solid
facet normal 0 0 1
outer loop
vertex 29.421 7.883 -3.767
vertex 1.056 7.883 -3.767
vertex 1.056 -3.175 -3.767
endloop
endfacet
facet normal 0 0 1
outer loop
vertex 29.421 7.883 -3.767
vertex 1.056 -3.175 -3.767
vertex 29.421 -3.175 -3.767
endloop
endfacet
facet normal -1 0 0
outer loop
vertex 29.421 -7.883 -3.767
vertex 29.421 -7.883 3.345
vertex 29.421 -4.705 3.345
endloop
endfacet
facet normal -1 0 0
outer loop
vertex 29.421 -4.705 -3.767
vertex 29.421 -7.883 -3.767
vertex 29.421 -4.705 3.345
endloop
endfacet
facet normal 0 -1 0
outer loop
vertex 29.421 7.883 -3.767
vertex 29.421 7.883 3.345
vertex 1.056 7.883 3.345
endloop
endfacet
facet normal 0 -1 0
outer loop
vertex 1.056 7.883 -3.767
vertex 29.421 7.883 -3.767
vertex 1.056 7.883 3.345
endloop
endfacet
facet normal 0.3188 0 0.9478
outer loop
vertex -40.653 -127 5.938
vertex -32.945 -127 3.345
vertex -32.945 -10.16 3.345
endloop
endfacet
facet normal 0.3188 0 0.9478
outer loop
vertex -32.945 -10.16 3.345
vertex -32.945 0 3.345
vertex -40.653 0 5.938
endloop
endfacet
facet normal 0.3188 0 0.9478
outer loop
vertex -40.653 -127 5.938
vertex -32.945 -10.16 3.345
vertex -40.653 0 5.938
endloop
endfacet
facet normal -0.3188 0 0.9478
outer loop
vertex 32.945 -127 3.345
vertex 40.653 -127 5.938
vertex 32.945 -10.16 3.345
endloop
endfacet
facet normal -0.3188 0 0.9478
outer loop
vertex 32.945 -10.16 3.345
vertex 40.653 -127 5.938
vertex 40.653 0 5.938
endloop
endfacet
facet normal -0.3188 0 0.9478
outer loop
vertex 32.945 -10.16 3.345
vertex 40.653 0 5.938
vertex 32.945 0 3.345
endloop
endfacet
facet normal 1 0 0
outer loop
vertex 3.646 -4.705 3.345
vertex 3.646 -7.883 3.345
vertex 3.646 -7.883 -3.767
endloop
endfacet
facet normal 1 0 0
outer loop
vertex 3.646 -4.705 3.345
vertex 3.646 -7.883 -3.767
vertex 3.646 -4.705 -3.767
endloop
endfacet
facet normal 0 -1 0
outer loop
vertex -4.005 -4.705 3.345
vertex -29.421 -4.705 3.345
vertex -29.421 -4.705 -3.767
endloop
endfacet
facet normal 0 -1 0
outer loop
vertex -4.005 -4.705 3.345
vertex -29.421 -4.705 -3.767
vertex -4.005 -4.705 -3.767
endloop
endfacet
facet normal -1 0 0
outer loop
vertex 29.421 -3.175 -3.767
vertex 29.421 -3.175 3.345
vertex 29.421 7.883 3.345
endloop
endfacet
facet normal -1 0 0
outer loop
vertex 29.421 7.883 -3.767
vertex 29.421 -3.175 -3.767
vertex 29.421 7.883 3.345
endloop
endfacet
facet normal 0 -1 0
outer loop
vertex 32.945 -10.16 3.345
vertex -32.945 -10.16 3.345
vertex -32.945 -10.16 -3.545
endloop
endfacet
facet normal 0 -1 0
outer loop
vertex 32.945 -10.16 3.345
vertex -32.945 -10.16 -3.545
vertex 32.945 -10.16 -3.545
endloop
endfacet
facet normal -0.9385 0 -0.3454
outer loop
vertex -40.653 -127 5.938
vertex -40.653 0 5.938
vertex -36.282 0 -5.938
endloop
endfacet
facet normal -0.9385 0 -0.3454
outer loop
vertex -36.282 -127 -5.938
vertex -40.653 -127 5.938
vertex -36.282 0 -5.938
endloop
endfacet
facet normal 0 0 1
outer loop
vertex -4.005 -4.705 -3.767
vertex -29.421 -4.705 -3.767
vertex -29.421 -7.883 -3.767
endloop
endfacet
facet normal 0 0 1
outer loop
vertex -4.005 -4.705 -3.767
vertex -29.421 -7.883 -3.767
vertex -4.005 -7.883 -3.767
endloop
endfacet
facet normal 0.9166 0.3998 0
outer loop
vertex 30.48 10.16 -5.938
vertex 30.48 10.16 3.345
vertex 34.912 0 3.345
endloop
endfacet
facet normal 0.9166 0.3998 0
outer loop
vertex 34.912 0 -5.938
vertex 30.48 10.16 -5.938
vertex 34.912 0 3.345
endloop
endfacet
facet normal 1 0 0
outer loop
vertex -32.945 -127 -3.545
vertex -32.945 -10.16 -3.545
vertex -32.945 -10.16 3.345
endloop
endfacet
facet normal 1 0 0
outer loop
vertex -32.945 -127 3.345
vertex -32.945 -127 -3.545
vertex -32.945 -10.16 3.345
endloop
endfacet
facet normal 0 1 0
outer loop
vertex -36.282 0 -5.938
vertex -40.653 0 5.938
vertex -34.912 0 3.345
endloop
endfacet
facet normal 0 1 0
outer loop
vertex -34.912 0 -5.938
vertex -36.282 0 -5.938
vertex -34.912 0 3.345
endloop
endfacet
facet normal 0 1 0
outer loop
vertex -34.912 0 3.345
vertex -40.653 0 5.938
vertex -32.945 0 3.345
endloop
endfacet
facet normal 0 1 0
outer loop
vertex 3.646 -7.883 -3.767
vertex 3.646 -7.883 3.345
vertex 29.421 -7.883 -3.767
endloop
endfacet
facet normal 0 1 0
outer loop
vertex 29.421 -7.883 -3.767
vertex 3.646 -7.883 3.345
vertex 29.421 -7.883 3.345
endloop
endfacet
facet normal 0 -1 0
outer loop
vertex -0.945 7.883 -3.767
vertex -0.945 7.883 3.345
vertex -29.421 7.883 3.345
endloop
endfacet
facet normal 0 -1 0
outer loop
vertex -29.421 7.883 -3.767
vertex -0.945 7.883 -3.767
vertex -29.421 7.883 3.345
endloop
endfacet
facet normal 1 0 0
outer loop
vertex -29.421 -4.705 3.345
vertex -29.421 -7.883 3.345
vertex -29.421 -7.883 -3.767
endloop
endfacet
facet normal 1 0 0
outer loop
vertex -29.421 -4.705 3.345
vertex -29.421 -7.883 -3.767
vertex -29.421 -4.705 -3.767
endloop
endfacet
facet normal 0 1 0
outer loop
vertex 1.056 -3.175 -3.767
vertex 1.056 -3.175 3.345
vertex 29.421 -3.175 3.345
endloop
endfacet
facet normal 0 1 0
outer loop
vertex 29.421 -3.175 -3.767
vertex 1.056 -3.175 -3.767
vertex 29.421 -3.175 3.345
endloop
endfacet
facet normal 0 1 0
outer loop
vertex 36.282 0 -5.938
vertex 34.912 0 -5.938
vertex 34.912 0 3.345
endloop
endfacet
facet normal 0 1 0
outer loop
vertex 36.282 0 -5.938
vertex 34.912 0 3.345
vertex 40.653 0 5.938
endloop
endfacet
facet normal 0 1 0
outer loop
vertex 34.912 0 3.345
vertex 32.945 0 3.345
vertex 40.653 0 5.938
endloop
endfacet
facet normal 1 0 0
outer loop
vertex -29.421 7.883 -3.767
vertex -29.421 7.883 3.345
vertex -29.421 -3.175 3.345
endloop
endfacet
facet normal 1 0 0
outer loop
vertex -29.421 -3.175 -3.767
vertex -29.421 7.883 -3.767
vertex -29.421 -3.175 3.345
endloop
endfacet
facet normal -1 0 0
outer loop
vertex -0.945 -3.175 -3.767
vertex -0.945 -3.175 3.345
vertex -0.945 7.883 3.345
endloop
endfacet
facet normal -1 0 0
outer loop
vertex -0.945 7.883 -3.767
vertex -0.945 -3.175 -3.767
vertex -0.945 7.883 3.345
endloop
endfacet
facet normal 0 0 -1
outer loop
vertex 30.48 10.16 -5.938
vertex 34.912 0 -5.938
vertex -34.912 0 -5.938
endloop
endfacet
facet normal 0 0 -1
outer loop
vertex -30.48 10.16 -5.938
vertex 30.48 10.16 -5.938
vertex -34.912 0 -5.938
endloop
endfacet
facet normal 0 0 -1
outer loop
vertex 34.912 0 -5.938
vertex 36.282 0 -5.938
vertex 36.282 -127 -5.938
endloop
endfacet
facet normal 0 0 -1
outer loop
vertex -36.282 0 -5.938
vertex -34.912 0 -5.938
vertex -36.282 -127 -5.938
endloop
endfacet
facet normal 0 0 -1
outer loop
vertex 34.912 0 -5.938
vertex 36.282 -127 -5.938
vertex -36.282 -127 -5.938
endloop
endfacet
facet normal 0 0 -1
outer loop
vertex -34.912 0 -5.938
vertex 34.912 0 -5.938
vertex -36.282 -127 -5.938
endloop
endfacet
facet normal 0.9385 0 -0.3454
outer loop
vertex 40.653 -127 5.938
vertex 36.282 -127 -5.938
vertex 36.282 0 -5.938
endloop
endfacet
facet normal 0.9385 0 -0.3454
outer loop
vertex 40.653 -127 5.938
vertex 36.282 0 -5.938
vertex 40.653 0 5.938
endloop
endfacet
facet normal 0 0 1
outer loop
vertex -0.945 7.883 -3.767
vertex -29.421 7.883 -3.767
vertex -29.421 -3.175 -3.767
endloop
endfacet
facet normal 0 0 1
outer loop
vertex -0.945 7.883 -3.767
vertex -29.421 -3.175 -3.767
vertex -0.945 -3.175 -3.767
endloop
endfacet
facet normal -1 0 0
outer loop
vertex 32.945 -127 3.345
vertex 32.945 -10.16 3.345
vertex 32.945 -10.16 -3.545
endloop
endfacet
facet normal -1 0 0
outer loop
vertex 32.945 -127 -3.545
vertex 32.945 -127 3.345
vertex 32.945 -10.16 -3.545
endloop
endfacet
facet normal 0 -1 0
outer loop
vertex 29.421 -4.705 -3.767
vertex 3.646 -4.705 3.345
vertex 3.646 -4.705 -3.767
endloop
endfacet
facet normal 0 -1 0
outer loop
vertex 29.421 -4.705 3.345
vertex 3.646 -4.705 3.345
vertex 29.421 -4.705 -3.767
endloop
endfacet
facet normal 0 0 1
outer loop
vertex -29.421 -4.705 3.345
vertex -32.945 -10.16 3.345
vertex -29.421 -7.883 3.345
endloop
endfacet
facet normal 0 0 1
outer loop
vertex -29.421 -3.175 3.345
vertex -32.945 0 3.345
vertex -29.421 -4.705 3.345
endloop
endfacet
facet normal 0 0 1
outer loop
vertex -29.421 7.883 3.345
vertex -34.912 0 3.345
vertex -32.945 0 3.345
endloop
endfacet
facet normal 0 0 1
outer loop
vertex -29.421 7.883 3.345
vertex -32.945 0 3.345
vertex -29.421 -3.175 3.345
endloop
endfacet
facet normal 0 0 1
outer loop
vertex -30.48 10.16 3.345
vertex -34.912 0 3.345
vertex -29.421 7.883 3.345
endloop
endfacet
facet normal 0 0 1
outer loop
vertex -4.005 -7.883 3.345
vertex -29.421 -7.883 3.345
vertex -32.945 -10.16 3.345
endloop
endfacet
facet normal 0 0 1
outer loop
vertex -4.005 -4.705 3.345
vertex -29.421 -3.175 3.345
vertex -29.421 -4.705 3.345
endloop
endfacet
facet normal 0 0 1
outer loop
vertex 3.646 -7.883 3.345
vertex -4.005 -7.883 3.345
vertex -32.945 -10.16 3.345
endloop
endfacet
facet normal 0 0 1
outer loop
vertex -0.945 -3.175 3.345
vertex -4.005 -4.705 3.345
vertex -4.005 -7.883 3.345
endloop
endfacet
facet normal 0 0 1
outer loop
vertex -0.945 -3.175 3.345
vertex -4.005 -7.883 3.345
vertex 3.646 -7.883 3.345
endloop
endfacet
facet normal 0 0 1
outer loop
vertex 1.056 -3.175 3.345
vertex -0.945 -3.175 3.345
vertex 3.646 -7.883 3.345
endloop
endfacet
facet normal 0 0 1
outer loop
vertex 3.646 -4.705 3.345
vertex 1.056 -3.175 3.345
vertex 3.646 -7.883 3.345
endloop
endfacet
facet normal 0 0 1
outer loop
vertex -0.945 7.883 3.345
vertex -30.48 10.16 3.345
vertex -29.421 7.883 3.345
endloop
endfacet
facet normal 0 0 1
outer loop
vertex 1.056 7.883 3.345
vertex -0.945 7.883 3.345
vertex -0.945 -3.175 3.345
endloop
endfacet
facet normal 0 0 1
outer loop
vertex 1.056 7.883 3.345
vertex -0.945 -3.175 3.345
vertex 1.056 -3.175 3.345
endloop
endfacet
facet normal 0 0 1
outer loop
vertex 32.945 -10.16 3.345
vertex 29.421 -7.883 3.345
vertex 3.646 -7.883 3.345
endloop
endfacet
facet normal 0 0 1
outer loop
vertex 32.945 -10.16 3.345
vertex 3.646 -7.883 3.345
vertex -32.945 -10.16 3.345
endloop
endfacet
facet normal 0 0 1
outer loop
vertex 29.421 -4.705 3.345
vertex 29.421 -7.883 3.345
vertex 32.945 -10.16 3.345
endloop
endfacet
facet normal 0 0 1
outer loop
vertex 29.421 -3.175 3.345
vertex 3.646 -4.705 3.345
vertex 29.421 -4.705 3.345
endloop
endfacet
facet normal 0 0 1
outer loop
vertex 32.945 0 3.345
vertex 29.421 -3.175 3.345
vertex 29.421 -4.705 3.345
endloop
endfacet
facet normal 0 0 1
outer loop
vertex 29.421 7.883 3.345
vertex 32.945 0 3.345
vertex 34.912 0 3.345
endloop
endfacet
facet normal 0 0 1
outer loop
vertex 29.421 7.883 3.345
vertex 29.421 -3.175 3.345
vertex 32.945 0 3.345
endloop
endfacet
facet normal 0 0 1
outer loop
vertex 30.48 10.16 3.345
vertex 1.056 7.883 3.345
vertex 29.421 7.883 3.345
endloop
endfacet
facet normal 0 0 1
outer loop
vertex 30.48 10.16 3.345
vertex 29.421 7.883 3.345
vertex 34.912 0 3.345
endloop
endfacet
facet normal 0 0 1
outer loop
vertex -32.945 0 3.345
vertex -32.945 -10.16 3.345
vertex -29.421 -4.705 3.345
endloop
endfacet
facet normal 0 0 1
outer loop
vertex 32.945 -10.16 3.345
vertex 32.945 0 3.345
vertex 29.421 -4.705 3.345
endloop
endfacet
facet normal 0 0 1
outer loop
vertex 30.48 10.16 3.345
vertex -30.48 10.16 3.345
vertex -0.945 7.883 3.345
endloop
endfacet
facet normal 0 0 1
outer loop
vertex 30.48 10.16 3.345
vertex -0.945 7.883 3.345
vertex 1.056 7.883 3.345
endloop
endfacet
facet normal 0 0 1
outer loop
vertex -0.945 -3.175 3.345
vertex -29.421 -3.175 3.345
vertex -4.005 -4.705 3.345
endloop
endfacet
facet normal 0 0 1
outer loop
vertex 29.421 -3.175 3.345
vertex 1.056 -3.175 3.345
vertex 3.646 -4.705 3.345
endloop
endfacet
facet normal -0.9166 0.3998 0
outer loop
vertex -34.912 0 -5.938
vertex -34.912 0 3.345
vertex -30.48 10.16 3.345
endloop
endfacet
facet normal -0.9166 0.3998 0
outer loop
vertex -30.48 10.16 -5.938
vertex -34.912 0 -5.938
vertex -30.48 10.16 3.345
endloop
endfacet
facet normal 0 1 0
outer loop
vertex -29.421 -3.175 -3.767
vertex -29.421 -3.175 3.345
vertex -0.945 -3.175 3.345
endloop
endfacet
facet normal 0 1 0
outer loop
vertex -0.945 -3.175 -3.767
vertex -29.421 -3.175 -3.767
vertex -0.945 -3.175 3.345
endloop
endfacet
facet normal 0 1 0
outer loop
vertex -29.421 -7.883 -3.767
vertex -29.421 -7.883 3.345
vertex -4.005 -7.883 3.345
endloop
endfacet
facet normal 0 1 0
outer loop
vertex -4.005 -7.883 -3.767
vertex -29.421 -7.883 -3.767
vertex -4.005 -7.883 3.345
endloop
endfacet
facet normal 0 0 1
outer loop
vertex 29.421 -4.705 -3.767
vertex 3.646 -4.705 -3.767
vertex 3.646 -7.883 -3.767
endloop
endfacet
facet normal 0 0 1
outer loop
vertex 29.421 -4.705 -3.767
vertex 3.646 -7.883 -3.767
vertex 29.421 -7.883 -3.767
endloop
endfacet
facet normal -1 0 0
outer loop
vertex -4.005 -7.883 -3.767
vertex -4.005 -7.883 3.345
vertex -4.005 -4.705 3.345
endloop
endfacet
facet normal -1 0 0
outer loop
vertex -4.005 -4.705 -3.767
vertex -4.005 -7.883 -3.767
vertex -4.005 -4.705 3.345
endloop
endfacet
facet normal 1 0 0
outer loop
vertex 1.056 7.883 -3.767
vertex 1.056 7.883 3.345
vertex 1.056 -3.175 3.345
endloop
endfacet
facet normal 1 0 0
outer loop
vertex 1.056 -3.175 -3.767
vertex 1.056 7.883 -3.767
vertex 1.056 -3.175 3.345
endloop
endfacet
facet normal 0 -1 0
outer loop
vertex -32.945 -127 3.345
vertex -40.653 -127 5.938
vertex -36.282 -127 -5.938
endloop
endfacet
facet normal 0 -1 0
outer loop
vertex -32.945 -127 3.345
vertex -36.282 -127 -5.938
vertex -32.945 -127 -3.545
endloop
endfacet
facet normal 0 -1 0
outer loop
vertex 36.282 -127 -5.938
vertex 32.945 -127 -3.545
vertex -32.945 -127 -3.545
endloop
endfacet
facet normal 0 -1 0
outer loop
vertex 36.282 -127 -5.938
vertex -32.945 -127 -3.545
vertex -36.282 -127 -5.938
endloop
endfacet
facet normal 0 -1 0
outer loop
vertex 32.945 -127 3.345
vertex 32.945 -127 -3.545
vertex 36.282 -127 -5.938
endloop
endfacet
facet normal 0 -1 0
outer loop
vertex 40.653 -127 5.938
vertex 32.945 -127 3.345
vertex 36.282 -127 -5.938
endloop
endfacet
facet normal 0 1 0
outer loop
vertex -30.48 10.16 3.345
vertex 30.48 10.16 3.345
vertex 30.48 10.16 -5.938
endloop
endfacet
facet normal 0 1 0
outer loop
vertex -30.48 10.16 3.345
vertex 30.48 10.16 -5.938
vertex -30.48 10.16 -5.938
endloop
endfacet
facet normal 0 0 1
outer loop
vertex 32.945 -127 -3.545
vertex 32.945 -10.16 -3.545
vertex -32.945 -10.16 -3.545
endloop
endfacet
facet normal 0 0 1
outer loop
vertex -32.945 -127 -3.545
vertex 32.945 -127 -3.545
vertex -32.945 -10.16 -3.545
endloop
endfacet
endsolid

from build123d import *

# Parameters (mm, degrees)
F1_DEPTH = 127
F3_DEPTH = 10.16
F4_W     = 65.889194
F4_H     = 6.89044
F5_DEPTH = 10.16
F7_DEPTH = 25.4
F8_W     = 25.775215
F8_H     = 3.177766
F8_W_2   = 25.416197
F9_DEPTH = 7.112


with BuildPart() as f1:
    # F0 (on Front) → F1 (new body)
    with BuildSketch(Plane.XZ):
        Polygon((-40.653061, 5.938083), (-36.282156, -5.938083), (36.282156, -5.938083), (40.653061, 5.938083), (32.944597, 3.345205), (32.944597, -3.545235), (0, -3.545235), (-32.944597, -3.545235), (-32.944597, 3.345205), align=None)
    extrude(amount=F1_DEPTH)

    # F2 (on face) → F3 (join)
    with BuildSketch(Plane(origin=(0, 0, 0), x_dir=(-1, 0, 0), z_dir=(0, 1, 0))):
        Polygon((-34.912035, 3.345205), (-34.912035, -5.938083), (34.912035, -5.938083), (34.912035, 3.345205), (-32.944597, 3.345205), align=None)
    extrude(amount=F3_DEPTH)

    # F4 (on face) → F5 (join)
    with BuildSketch(Plane.XZ):
        with Locations((0, -0.100015)):
            Rectangle(F4_W, F4_H)
    extrude(amount=F5_DEPTH)

    # F6 (on face) → F7 (cut)
    with BuildSketch(Plane.XY.offset(3.345205)):
        Polygon((30.480051, 10.16), (34.912035, 0), (34.912035, 10.16), align=None)
        Polygon((-34.912035, 10.16), (-34.912035, 0), (-30.480051, 10.16), align=None)
    extrude(amount=-F7_DEPTH, mode=Mode.SUBTRACT)

    # F8 (on face) → F9 (cut)
    with BuildSketch(Plane.XY.offset(3.345205)):
        with Locations((16.533188, -6.29418)):
            Rectangle(F8_W, F8_H)
        Polygon((29.420795, -3.175261), (29.420795, 7.883063), (1.056288, 7.883063), (1.056288, -3.175261), (3.64558, -3.175261), align=None)
        with Locations((-16.712696, -6.29418)):
            Rectangle(F8_W_2, F8_H)
        Polygon((-29.420795, 7.883063), (-29.420795, -3.175261), (-4.004598, -3.175261), (-0.944527, -3.175261), (-0.944527, 7.883063), align=None)
    extrude(amount=-F9_DEPTH, mode=Mode.SUBTRACT)


solid = f1.part
